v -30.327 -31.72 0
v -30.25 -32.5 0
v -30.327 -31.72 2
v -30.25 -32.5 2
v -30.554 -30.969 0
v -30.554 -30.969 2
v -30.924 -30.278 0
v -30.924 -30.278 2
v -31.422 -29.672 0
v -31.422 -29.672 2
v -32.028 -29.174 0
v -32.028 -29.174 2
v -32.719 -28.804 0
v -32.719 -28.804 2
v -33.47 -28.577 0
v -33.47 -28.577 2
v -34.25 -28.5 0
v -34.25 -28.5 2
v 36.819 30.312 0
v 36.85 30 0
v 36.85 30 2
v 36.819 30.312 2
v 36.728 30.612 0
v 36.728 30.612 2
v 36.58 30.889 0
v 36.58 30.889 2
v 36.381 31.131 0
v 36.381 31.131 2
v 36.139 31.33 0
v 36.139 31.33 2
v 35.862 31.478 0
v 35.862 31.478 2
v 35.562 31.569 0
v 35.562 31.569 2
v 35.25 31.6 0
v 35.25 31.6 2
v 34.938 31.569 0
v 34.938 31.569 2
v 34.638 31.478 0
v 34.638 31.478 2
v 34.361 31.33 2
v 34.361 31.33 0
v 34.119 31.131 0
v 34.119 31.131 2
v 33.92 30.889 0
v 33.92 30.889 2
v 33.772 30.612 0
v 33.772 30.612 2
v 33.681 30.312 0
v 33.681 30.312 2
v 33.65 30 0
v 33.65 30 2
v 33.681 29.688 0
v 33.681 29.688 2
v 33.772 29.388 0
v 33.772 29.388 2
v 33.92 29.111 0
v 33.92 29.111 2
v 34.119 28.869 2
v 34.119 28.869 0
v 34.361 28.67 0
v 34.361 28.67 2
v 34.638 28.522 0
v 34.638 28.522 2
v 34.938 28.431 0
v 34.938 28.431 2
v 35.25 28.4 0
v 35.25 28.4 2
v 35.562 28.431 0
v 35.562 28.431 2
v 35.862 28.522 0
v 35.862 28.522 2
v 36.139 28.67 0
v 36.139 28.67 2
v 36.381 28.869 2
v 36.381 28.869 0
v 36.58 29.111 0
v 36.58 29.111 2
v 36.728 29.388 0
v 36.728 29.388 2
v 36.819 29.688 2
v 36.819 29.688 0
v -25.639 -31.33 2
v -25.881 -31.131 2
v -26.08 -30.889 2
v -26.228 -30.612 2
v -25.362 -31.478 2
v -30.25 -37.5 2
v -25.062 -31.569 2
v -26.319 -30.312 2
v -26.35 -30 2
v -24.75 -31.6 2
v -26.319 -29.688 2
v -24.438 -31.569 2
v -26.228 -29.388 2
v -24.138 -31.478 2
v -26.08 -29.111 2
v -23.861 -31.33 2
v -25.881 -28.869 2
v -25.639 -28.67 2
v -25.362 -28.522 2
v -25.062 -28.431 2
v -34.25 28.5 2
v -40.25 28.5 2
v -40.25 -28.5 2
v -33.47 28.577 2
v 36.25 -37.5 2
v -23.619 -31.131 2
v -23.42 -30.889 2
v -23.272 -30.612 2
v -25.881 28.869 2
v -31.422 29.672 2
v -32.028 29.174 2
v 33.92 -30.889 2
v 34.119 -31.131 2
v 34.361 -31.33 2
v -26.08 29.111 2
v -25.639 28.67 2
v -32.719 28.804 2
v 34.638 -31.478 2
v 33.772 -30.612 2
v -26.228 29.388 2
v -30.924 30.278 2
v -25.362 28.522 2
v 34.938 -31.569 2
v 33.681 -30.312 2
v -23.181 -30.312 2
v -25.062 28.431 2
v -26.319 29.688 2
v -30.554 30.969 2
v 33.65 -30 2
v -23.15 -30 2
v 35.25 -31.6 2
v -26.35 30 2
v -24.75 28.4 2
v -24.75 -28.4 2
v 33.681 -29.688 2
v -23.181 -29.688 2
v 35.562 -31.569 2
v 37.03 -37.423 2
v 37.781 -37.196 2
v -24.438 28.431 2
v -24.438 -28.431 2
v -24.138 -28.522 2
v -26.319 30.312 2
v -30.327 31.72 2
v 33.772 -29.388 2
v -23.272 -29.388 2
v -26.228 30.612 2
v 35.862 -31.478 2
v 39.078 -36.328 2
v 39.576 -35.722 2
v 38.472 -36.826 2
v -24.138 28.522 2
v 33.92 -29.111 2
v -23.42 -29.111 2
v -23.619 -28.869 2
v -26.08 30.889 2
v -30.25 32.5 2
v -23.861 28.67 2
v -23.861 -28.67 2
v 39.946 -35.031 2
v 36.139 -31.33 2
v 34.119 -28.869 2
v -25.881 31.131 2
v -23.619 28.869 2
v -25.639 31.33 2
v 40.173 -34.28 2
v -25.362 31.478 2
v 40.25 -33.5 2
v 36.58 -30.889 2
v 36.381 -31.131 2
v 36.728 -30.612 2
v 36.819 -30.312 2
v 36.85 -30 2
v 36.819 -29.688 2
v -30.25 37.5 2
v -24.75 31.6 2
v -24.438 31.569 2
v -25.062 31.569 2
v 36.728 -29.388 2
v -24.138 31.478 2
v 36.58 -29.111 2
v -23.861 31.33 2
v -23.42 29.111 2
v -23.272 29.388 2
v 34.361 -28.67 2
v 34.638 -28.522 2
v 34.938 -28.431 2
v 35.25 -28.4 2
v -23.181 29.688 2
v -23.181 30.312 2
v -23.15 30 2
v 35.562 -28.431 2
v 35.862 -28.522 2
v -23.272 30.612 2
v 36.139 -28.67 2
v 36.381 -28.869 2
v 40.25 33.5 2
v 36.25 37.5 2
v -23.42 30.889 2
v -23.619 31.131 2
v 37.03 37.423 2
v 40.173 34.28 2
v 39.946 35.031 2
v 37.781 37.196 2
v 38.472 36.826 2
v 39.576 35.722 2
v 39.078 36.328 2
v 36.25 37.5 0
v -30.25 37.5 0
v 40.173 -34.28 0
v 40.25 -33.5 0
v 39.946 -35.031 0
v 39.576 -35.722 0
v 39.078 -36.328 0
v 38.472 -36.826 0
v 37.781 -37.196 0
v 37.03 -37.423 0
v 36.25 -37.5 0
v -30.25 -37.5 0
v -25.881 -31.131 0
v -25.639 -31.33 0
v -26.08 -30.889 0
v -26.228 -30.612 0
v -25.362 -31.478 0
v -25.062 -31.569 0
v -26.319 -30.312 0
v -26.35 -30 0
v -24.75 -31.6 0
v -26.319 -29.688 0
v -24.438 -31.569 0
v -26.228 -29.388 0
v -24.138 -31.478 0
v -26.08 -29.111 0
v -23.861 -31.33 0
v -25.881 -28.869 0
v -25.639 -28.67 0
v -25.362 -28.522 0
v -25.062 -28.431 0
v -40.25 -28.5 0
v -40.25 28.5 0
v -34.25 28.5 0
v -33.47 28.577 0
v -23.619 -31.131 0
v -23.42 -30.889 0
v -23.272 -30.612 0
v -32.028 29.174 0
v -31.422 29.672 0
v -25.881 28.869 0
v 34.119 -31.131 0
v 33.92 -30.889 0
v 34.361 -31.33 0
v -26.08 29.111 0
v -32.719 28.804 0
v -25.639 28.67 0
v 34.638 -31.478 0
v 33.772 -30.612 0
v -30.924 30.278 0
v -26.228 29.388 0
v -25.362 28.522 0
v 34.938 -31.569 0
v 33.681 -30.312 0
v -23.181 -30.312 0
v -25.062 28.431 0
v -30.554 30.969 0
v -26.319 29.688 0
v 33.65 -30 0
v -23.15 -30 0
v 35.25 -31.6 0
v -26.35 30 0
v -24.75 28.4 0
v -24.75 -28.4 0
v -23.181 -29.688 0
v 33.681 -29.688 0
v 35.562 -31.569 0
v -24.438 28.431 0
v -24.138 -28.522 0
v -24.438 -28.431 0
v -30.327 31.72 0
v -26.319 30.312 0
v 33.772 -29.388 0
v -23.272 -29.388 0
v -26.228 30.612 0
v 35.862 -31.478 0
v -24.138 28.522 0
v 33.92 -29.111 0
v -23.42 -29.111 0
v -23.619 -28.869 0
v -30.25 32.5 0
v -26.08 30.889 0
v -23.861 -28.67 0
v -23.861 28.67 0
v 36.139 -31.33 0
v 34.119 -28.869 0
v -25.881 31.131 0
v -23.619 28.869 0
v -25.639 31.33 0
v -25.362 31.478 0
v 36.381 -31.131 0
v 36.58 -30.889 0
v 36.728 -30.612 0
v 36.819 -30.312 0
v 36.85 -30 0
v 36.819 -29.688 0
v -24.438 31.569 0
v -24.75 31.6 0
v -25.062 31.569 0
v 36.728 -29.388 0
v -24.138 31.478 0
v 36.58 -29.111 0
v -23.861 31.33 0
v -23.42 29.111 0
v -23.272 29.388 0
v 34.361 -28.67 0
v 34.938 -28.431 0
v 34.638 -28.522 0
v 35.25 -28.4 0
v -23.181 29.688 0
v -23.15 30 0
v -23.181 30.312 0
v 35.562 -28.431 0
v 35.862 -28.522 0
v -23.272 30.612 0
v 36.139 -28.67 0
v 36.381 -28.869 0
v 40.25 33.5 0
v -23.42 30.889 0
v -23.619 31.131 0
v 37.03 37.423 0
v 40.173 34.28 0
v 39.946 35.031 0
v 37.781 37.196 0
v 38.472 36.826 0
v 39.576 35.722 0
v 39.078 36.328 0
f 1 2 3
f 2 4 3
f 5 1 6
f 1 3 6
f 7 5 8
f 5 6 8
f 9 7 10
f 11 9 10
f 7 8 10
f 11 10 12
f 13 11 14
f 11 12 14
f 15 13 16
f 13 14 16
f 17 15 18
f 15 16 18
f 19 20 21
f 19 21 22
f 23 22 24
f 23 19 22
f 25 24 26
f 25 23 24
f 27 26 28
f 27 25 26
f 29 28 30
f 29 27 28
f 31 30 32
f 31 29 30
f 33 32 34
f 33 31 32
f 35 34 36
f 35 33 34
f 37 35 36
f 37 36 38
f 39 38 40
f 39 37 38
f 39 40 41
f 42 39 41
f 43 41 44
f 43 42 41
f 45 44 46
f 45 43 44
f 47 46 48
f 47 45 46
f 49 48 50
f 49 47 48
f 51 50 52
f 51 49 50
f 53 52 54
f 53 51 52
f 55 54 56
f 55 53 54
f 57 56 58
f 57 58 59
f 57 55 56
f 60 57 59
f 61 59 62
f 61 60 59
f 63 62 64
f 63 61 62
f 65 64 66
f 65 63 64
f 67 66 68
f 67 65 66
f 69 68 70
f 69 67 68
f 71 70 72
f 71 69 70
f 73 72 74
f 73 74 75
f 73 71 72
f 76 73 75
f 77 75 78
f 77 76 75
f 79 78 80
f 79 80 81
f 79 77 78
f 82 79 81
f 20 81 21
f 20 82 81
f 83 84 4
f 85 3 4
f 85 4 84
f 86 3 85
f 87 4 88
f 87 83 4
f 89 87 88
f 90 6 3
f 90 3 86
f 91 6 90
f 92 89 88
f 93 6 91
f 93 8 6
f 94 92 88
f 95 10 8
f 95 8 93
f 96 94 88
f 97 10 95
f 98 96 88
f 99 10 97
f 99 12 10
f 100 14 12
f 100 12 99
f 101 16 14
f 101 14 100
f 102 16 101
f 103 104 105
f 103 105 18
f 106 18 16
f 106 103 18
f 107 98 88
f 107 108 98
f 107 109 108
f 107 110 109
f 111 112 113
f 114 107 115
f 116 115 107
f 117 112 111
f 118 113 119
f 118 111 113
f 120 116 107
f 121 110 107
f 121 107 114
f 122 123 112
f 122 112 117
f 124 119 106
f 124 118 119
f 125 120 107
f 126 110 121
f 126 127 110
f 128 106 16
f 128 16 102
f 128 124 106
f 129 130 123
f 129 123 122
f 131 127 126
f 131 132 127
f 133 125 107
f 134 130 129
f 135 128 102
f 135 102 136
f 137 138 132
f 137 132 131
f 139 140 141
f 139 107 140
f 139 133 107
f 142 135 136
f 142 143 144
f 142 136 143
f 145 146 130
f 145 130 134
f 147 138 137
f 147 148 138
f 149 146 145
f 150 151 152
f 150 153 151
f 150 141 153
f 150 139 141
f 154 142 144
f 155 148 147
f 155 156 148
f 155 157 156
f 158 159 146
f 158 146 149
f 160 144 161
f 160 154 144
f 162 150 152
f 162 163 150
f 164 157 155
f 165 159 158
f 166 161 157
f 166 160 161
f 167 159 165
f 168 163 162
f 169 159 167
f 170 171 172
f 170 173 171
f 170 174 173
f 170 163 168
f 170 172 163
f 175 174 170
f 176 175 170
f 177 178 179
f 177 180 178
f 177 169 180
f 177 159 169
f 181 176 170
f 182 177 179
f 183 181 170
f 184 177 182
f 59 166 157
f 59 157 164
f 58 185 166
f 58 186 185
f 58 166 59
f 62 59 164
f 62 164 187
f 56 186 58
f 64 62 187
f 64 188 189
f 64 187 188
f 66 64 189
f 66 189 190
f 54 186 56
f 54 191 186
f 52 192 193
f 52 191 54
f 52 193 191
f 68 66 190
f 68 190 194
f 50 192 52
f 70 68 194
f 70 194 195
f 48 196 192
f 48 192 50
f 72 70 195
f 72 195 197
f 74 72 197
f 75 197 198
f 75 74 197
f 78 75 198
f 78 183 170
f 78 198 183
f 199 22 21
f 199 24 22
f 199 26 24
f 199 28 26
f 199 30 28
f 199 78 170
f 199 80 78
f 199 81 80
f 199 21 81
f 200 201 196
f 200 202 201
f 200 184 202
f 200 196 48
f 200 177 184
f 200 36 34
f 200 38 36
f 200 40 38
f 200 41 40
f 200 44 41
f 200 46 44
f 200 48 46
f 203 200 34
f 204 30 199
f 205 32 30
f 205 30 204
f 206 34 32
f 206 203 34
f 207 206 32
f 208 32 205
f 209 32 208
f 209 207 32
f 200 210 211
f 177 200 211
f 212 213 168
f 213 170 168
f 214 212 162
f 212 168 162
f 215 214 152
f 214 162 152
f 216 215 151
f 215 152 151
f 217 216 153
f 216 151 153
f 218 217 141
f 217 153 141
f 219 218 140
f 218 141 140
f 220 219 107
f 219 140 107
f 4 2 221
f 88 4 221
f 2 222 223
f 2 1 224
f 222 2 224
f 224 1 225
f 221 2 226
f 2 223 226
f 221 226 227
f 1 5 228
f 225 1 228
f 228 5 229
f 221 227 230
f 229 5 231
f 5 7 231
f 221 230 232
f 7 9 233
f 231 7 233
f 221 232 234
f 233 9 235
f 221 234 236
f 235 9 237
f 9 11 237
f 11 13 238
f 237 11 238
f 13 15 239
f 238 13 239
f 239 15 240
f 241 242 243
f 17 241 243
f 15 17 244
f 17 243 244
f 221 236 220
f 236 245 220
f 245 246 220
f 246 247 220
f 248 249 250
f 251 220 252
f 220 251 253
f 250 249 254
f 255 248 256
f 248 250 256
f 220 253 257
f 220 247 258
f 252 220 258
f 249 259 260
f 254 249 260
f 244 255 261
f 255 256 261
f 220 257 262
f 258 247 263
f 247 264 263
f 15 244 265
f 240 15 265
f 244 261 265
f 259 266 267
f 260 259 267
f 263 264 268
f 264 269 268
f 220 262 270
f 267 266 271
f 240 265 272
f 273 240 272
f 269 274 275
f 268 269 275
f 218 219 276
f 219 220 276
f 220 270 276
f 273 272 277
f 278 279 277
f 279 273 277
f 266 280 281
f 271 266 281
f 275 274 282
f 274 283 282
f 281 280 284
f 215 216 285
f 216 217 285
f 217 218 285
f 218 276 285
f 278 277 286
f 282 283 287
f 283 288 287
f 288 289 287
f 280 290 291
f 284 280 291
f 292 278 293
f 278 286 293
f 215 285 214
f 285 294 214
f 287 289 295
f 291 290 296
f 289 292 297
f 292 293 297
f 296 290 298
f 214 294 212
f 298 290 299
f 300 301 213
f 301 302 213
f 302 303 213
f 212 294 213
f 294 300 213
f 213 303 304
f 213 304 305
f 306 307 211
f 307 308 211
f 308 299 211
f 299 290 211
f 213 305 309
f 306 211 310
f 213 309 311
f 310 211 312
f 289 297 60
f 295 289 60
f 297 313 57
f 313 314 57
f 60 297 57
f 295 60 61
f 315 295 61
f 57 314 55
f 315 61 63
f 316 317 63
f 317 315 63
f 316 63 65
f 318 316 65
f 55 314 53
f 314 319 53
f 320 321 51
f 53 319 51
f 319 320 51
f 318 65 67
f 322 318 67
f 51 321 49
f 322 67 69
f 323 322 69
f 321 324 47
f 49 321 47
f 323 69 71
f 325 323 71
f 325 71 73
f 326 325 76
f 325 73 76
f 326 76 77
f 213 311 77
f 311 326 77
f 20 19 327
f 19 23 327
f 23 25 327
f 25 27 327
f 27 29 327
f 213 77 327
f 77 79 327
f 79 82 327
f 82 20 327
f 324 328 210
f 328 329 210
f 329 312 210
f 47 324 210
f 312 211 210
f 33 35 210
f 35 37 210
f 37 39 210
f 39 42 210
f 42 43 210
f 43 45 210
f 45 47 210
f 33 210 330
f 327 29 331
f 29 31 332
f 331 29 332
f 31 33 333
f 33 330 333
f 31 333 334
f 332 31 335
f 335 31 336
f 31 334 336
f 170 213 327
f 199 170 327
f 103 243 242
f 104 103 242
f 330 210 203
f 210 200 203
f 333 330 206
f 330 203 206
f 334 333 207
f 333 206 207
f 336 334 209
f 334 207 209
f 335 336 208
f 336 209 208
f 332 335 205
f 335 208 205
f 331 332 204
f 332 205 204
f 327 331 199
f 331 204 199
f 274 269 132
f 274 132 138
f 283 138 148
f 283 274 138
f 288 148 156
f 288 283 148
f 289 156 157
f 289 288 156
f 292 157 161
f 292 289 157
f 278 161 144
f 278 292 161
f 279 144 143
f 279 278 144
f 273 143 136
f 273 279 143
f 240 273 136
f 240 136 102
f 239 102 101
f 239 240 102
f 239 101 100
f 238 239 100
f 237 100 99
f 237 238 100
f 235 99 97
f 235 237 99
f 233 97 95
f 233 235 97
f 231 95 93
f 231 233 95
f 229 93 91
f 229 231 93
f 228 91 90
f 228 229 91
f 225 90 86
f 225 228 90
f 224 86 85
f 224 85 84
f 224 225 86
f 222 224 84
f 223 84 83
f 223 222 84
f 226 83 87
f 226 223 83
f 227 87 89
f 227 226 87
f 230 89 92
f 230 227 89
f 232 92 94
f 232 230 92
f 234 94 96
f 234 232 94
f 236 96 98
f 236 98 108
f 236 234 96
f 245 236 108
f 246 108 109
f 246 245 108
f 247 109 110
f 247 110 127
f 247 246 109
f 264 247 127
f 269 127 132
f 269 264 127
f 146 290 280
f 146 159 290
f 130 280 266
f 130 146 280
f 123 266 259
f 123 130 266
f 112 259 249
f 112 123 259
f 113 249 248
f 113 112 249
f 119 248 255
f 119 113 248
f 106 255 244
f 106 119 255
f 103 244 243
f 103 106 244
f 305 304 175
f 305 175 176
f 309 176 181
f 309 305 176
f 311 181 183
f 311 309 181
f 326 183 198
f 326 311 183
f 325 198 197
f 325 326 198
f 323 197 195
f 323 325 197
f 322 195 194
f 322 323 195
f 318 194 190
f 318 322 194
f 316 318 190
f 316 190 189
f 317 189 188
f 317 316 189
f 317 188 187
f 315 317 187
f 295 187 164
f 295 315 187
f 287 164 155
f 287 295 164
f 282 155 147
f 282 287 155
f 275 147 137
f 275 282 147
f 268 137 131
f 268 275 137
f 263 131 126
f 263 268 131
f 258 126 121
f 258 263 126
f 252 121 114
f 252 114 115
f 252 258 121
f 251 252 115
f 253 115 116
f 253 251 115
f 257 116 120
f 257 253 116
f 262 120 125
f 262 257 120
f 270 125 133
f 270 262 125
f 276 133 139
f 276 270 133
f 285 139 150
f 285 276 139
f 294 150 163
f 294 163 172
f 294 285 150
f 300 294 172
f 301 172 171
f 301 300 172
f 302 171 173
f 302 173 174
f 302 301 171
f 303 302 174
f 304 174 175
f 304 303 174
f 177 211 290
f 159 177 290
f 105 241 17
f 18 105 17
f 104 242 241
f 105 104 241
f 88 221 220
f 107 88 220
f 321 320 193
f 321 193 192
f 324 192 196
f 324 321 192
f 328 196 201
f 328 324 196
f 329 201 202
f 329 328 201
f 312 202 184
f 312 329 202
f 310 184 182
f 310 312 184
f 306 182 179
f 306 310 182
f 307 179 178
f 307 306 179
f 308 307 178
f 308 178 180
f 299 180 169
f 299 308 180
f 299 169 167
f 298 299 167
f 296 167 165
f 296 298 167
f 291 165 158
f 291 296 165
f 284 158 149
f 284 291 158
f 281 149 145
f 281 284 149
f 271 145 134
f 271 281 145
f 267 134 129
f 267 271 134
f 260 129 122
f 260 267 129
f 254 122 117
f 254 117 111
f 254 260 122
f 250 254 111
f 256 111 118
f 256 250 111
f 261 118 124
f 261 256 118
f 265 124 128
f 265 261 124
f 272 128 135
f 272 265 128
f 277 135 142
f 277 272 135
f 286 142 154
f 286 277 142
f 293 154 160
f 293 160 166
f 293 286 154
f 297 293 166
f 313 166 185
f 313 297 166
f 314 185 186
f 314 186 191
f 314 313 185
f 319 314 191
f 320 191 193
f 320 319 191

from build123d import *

# Parameters (mm, degrees)
SKETCH_1_R      = 1.6
EXTRUDE_1_DEPTH = 2
FILLET_1_R      = 4


with BuildPart() as part:
    # ｽｹｯﾁ1 → ﾎﾞｽ - 押し出し1 (new body)
    with BuildSketch(Plane.XY):
        Polygon((40.25, 37.5), (-30.25, 37.5), (-30.25, 28.5), (-40.25, 28.5), (-40.25, -28.5), (-30.25, -28.5), (-30.25, -37.5), (40.25, -37.5), align=None)
        with Locations((-24.75, -30)):
            Circle(SKETCH_1_R, mode=Mode.SUBTRACT)
        with Locations((35.25, -30)):
            Circle(SKETCH_1_R, mode=Mode.SUBTRACT)
        with Locations((-24.75, 30)):
            Circle(SKETCH_1_R, mode=Mode.SUBTRACT)
        with Locations((35.25, 30)):
            Circle(SKETCH_1_R, mode=Mode.SUBTRACT)
    extrude(amount=EXTRUDE_1_DEPTH)

    # ﾌｨﾚｯﾄ1
    fillet_1_edges = [part.edges().sort_by_distance(p)[0] for p in [
        (-30.25, -28.5, 1),
        (-30.25, 28.5, 1),
        (40.25, 37.5, 1),
        (40.25, -37.5, 1),
    ]]
    fillet(fillet_1_edges, radius=FILLET_1_R)


solid = part.part
